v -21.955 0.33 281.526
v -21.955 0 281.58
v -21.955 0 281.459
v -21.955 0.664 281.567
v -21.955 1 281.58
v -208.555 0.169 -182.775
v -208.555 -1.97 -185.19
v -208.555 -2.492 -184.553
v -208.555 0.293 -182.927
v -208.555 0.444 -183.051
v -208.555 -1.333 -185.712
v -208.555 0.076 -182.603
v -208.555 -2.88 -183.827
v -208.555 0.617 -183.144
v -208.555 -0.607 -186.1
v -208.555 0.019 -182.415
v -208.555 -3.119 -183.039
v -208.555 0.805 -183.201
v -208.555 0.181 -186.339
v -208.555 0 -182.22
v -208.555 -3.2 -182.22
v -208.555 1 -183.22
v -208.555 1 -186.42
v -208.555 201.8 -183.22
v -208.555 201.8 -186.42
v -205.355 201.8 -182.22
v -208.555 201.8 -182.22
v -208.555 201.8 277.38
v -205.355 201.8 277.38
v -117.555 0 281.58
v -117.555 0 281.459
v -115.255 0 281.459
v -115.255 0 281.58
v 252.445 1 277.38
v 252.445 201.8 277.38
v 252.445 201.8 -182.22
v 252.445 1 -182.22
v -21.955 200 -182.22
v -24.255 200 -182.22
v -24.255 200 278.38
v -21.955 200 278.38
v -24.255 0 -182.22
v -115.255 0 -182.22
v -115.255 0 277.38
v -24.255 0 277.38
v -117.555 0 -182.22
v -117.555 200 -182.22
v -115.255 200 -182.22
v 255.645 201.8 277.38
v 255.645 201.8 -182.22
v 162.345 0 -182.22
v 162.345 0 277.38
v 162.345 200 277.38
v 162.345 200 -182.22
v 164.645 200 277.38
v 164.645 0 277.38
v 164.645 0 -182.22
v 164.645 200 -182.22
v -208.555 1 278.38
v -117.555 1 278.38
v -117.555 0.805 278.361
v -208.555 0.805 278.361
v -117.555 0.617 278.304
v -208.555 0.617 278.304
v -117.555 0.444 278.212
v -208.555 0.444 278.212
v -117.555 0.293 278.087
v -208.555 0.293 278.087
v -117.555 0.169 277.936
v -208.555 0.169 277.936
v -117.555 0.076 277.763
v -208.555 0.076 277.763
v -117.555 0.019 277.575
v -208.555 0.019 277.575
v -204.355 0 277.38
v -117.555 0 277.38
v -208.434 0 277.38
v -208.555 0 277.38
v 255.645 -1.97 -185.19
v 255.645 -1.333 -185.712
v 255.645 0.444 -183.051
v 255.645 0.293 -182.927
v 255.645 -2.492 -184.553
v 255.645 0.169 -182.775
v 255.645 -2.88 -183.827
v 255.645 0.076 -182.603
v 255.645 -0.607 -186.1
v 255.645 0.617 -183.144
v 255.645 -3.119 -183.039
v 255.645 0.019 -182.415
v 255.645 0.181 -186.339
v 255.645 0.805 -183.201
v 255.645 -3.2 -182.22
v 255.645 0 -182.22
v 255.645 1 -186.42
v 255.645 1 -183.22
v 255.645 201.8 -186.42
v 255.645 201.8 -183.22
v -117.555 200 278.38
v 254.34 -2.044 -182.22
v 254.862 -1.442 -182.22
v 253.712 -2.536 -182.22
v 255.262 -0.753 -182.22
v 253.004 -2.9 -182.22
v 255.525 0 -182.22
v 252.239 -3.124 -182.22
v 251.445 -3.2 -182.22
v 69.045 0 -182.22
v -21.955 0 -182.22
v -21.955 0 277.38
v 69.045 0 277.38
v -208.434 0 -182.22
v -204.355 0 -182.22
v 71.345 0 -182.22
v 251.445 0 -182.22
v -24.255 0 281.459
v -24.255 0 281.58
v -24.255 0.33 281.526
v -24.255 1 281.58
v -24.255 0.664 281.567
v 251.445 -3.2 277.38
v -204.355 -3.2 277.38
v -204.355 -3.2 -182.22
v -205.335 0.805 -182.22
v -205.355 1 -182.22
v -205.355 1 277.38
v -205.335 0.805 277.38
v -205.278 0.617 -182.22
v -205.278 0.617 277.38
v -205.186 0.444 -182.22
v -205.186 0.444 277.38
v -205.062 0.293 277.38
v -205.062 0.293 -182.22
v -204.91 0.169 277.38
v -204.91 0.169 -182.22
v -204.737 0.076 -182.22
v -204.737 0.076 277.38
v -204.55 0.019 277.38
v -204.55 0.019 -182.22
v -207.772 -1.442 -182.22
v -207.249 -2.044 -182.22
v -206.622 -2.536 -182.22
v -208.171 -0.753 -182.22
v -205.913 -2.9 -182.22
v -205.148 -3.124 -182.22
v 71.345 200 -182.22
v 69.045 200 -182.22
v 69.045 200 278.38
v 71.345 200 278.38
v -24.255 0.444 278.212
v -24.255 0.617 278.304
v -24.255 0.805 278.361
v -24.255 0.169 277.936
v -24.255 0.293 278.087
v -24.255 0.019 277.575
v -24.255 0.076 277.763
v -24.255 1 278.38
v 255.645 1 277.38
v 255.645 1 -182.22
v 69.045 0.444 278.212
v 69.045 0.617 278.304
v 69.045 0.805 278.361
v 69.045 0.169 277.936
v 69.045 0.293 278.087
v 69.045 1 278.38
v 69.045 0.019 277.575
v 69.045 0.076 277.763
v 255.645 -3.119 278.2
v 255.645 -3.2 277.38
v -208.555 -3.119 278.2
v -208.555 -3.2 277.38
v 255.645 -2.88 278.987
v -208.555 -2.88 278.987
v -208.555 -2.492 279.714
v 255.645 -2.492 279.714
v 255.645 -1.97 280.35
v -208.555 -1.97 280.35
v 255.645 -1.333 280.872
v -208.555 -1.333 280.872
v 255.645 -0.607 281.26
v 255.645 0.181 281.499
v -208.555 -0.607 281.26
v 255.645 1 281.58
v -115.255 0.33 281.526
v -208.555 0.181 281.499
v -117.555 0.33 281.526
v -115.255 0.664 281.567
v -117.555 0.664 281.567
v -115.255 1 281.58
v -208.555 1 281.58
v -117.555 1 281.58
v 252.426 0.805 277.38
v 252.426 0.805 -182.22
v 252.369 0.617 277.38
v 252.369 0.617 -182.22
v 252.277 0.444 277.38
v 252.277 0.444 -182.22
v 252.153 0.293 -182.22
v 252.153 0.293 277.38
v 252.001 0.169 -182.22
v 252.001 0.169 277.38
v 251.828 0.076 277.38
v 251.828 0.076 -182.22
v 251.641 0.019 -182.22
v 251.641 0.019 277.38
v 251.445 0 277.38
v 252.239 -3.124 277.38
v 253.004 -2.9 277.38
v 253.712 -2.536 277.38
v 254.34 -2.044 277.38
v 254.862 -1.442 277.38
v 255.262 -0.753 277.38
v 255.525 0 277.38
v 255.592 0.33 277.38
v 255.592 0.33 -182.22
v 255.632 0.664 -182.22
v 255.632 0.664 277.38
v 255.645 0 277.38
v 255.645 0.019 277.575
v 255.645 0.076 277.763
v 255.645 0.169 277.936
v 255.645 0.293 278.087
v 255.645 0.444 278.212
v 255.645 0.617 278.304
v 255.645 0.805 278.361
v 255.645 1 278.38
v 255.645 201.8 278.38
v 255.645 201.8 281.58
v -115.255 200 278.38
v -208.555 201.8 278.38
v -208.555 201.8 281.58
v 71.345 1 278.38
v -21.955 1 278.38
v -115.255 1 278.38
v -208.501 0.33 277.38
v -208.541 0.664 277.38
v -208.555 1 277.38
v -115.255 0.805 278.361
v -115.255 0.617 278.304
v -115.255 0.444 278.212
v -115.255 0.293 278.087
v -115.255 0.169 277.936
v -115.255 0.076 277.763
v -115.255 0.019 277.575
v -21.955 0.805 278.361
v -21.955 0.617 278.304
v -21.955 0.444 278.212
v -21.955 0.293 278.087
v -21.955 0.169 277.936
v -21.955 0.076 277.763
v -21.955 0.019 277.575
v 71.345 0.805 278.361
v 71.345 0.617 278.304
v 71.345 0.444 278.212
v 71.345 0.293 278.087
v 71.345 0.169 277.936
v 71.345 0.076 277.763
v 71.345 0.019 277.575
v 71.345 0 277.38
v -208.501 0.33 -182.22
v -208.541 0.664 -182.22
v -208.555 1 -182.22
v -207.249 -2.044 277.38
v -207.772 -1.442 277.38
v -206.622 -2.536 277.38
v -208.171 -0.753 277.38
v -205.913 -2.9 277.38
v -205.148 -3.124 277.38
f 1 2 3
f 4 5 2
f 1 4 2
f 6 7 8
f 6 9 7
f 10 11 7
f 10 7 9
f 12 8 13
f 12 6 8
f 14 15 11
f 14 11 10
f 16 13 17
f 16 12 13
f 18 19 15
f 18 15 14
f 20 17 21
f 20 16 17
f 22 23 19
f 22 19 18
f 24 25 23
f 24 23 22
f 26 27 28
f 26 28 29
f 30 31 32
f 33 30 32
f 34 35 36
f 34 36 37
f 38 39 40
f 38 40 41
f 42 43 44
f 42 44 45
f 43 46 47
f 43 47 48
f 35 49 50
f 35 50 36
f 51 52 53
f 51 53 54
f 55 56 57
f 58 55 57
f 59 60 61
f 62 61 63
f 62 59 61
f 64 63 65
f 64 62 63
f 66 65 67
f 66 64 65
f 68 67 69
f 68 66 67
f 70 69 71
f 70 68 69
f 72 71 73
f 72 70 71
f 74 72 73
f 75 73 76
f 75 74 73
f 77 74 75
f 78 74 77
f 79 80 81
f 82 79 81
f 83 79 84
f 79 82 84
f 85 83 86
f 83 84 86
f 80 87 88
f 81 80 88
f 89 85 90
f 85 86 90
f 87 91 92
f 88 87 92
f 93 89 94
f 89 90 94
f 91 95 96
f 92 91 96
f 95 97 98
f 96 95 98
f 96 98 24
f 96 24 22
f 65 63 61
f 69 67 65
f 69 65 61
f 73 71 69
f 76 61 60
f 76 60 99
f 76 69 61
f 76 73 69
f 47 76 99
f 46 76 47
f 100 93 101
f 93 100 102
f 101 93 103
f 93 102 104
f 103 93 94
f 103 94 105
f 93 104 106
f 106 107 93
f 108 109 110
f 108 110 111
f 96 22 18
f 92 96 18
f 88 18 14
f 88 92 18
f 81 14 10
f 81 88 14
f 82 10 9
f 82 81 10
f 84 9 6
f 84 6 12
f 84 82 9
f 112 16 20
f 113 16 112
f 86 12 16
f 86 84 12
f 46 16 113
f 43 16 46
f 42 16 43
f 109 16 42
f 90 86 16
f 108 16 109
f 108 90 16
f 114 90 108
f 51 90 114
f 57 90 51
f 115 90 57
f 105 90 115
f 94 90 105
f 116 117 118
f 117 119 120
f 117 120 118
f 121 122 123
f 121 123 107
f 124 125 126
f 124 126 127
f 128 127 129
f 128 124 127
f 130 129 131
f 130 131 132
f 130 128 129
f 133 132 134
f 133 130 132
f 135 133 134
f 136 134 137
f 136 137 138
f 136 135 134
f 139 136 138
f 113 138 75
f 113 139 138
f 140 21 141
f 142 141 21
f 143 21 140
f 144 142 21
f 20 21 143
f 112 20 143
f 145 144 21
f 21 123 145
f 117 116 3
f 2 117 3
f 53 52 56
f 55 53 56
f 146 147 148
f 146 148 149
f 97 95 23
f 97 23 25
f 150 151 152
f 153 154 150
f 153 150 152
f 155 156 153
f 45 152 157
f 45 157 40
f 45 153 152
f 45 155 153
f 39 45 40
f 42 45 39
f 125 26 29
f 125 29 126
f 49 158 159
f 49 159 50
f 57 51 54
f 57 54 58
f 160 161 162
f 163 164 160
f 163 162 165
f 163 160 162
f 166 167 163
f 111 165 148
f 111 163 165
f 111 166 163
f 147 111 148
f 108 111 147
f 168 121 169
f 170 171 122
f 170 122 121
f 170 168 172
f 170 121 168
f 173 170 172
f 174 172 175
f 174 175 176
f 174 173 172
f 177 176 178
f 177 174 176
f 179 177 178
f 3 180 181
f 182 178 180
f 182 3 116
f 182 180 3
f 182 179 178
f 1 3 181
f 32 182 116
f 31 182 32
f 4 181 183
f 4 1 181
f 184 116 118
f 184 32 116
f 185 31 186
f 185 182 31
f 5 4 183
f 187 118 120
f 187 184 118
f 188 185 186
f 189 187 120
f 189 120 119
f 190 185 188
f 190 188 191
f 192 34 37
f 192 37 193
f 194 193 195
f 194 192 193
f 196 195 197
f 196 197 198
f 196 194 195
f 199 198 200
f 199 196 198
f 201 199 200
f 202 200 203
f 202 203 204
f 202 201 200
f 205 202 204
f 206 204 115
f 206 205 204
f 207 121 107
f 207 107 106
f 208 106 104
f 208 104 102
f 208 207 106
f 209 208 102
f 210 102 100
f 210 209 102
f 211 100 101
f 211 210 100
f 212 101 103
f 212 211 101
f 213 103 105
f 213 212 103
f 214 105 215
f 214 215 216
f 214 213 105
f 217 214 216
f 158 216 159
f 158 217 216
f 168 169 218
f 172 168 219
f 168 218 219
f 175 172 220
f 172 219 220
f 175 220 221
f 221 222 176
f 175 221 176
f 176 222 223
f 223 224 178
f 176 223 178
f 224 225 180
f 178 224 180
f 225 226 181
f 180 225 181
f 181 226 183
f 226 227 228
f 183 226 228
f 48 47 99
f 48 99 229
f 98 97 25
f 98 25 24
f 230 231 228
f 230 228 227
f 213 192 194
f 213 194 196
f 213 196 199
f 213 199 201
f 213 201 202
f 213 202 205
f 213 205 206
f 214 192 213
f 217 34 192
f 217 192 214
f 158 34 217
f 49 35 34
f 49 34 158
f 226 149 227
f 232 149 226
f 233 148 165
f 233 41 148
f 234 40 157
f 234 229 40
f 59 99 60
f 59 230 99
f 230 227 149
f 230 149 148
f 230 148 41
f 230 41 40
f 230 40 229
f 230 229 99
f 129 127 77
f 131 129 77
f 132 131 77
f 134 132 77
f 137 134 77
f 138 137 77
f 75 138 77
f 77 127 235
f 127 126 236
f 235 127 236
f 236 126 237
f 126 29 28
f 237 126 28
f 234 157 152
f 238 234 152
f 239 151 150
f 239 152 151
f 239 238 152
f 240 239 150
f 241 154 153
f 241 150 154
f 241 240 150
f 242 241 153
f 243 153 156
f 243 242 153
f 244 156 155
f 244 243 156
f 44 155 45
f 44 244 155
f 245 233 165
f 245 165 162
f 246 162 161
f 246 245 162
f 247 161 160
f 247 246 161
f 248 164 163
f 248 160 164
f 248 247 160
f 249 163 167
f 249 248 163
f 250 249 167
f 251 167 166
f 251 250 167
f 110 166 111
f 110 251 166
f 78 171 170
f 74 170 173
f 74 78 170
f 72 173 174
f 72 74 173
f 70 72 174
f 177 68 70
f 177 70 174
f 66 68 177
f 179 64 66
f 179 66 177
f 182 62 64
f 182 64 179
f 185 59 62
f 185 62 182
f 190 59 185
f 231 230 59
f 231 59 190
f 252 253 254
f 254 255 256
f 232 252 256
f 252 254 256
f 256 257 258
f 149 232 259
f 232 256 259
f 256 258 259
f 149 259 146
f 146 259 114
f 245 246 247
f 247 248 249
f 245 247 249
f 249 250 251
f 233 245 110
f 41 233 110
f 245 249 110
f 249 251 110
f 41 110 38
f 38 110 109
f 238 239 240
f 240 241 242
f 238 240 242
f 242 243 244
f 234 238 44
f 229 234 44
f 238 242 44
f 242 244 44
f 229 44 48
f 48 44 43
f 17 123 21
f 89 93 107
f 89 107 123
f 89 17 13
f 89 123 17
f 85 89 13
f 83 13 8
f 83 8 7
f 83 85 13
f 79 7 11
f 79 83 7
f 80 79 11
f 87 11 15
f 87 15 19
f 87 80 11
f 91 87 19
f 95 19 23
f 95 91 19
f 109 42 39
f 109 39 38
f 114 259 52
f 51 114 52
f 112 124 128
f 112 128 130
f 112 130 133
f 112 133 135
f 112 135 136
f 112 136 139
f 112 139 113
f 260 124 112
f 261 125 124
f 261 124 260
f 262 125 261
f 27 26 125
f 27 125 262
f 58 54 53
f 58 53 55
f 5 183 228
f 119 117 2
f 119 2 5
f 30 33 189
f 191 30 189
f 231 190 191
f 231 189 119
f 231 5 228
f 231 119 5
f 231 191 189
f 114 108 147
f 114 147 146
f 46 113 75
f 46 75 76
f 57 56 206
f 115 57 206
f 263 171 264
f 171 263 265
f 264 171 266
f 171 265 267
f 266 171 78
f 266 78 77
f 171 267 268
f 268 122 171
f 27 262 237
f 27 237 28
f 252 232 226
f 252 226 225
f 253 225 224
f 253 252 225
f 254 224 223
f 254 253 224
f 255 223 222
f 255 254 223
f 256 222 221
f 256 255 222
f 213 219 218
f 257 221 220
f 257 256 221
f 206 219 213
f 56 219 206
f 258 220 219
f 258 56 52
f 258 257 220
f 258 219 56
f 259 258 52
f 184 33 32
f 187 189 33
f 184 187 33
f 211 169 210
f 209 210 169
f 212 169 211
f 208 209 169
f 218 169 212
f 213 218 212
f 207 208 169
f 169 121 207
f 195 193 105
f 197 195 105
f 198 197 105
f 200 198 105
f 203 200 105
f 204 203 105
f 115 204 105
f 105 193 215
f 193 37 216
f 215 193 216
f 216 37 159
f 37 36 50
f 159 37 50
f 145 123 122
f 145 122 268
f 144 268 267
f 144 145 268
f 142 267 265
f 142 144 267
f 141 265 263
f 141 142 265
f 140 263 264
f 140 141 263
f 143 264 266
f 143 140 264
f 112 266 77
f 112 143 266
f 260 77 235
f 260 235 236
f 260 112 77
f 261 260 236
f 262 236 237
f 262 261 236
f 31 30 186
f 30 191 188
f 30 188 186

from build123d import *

# Parameters (mm, degrees)
SKETCH1_W                      = 464.2
SKETCH1_H                      = 468
BASE_FLANGE1_DEPTH             = 3.2
EDGE_FLANGE1_STRIP_W           = 14.8
EDGE_FLANGE1_STRIP_H           = 3.2
EDGE_FLANGE1_STRIP_CUT_DEPTH   = 464.2
EDGE_FLANGE1_DEPTH             = 464.2
EDGE_FLANGE2_STRIP_W           = 14.8
EDGE_FLANGE2_STRIP_H           = 3.2
EDGE_FLANGE2_STRIP_CUT_DEPTH   = 464.2
EDGE_FLANGE2_DEPTH             = 464.2
SKETCH12_W                     = 2.3
SKETCH12_H                     = 459.6
SKETCH12_H_2                   = 462.8
SKETCH12_H_3                   = 463.8
BOSS_EXTRUDE1_DEPTH            = 200
EDGE_FLANGE3_STRIP_W           = 14.8
EDGE_FLANGE3_STRIP_H           = 3.2
EDGE_FLANGE3_STRIP_CUT_DEPTH   = 459.6
EDGE_FLANGE3_STRIP_2_W         = 14.8
EDGE_FLANGE3_STRIP_2_H         = 3.2
EDGE_FLANGE3_STRIP_CUT_2_DEPTH = 459.6
EDGE_FLANGE3_DEPTH             = 459.6
EDGE_FLANGE3_BEND_DEPTH        = 459.6


# Sheet-metal steps are written as plain solids
with BuildPart() as part:
    # Sketch1 → Base-Flange1 (new body)
    with BuildSketch(Plane(origin=(0, 0, 0), x_dir=(1, 0, 0), z_dir=(0, 1, 0))):
        with Locations((23.545430809, -47.580156658)):
            Rectangle(SKETCH1_W, SKETCH1_H)
    extrude(amount=-BASE_FLANGE1_DEPTH)

    # Edge-Flange1 strip (across the edge) → Edge-Flange1 strip cut (cut)
    with BuildSketch(Plane(origin=(255.645430809, 0, -186.419843342), x_dir=(0, 0, 1), z_dir=(-1, 0, 0))):
        with Locations((-3.2, -1.6)):
            Rectangle(EDGE_FLANGE1_STRIP_W, EDGE_FLANGE1_STRIP_H)
    extrude(amount=EDGE_FLANGE1_STRIP_CUT_DEPTH, mode=Mode.SUBTRACT)

    # Edge-Flange1 section (across the edge) → Edge-Flange1 (add)
    with BuildSketch(Plane(origin=(255.645430809, 0, -186.419843342), x_dir=(0, 0, 1), z_dir=(-1, 0, 0))):
        with BuildLine():
            Line((0, 1), (0, 201.8))
            Line((0, 201.8), (3.2, 201.8))
            Line((3.2, 201.8), (3.2, 1))
            ThreePointArc((3.2, 1), (3.492893219, 0.292893219), (4.2, 0))
            Line((4.2, 0), (4.2, -3.2))
            ThreePointArc((4.2, -3.2), (1.230151519, -1.969848481), (0, 1))
        make_face()
    extrude(amount=EDGE_FLANGE1_DEPTH)

    # Edge-Flange2 strip (across the edge) → Edge-Flange2 strip cut (cut)
    with BuildSketch(Plane(origin=(-208.554569191, 0, 281.580156658), x_dir=(0, 0, -1), z_dir=(1, 0, 0))):
        with Locations((-3.2, -1.6)):
            Rectangle(EDGE_FLANGE2_STRIP_W, EDGE_FLANGE2_STRIP_H)
    extrude(amount=EDGE_FLANGE2_STRIP_CUT_DEPTH, mode=Mode.SUBTRACT)

    # Edge-Flange2 section (across the edge) → Edge-Flange2 (add)
    with BuildSketch(Plane(origin=(-208.554569191, 0, 281.580156658), x_dir=(0, 0, -1), z_dir=(1, 0, 0))):
        with BuildLine():
            Line((0, 1), (0, 201.8))
            Line((0, 201.8), (3.2, 201.8))
            Line((3.2, 201.8), (3.2, 1))
            ThreePointArc((3.2, 1), (3.492893219, 0.292893219), (4.2, 0))
            Line((4.2, 0), (4.2, -3.2))
            ThreePointArc((4.2, -3.2), (1.230151519, -1.969848481), (0, 1))
        make_face()
    extrude(amount=EDGE_FLANGE2_DEPTH)

    # Sketch12 → Boss-Extrude1 (add)
    with BuildSketch(Plane(origin=(0, 0, 0), x_dir=(1, 0, 0), z_dir=(0, 1, 0))):
        with Locations((163.495430809, -47.580156658)):
            Rectangle(SKETCH12_W, SKETCH12_H)
        with Locations((70.195430809, -49.180156658)):
            Rectangle(SKETCH12_W, SKETCH12_H_2)
        with Locations((-23.104569191, -49.680156658)):
            Rectangle(SKETCH12_W, SKETCH12_H_3)
        with Locations((-116.404569191, -49.680156658)):
            Rectangle(SKETCH12_W, SKETCH12_H_3)
    extrude(amount=BOSS_EXTRUDE1_DEPTH)

    # Edge-Flange3 strip (across the edge) → Edge-Flange3 strip cut (cut)
    with BuildSketch(Plane(origin=(255.645430809, 0, 277.380156658), x_dir=(-1, 0, 0), z_dir=(0, 0, -1))):
        with Locations((-3.2, -1.6)):
            Rectangle(EDGE_FLANGE3_STRIP_W, EDGE_FLANGE3_STRIP_H)
    extrude(amount=EDGE_FLANGE3_STRIP_CUT_DEPTH, mode=Mode.SUBTRACT)

    # Edge-Flange3 strip 2 (across the edge) → Edge-Flange3 strip cut 2 (cut)
    with BuildSketch(Plane(origin=(-208.554569191, 0, -182.219843342), x_dir=(1, 0, 0), z_dir=(0, 0, 1))):
        with Locations((-3.2, -1.6)):
            Rectangle(EDGE_FLANGE3_STRIP_2_W, EDGE_FLANGE3_STRIP_2_H)
    extrude(amount=EDGE_FLANGE3_STRIP_CUT_2_DEPTH, mode=Mode.SUBTRACT)

    # Edge-Flange3 section (across the edge) → Edge-Flange3 (add)
    with BuildSketch(Plane(origin=(255.645430809, 0, 277.380156658), x_dir=(-1, 0, 0), z_dir=(0, 0, -1))):
        with BuildLine():
            Line((0, 1), (0, 201.8))
            Line((0, 201.8), (3.2, 201.8))
            Line((3.2, 201.8), (3.2, 1))
            ThreePointArc((3.2, 1), (3.492893219, 0.292893219), (4.2, 0))
            Line((4.2, 0), (4.2, -3.2))
            ThreePointArc((4.2, -3.2), (1.230151519, -1.969848481), (0, 1))
        make_face()
    extrude(amount=EDGE_FLANGE3_DEPTH)

    # Edge-Flange3 section 2 (across the edge) → Edge-Flange3 bend (add)
    with BuildSketch(Plane(origin=(-208.554569191, 0, -182.219843342), x_dir=(1, 0, 0), z_dir=(0, 0, 1))):
        with BuildLine():
            Line((0, 1), (0, 201.8))
            Line((0, 201.8), (3.2, 201.8))
            Line((3.2, 201.8), (3.2, 1))
            ThreePointArc((3.2, 1), (3.492893219, 0.292893219), (4.2, 0))
            Line((4.2, 0), (4.2, -3.2))
            ThreePointArc((4.2, -3.2), (1.230151519, -1.969848481), (0, 1))
        make_face()
    extrude(amount=EDGE_FLANGE3_BEND_DEPTH)


solid = part.part
